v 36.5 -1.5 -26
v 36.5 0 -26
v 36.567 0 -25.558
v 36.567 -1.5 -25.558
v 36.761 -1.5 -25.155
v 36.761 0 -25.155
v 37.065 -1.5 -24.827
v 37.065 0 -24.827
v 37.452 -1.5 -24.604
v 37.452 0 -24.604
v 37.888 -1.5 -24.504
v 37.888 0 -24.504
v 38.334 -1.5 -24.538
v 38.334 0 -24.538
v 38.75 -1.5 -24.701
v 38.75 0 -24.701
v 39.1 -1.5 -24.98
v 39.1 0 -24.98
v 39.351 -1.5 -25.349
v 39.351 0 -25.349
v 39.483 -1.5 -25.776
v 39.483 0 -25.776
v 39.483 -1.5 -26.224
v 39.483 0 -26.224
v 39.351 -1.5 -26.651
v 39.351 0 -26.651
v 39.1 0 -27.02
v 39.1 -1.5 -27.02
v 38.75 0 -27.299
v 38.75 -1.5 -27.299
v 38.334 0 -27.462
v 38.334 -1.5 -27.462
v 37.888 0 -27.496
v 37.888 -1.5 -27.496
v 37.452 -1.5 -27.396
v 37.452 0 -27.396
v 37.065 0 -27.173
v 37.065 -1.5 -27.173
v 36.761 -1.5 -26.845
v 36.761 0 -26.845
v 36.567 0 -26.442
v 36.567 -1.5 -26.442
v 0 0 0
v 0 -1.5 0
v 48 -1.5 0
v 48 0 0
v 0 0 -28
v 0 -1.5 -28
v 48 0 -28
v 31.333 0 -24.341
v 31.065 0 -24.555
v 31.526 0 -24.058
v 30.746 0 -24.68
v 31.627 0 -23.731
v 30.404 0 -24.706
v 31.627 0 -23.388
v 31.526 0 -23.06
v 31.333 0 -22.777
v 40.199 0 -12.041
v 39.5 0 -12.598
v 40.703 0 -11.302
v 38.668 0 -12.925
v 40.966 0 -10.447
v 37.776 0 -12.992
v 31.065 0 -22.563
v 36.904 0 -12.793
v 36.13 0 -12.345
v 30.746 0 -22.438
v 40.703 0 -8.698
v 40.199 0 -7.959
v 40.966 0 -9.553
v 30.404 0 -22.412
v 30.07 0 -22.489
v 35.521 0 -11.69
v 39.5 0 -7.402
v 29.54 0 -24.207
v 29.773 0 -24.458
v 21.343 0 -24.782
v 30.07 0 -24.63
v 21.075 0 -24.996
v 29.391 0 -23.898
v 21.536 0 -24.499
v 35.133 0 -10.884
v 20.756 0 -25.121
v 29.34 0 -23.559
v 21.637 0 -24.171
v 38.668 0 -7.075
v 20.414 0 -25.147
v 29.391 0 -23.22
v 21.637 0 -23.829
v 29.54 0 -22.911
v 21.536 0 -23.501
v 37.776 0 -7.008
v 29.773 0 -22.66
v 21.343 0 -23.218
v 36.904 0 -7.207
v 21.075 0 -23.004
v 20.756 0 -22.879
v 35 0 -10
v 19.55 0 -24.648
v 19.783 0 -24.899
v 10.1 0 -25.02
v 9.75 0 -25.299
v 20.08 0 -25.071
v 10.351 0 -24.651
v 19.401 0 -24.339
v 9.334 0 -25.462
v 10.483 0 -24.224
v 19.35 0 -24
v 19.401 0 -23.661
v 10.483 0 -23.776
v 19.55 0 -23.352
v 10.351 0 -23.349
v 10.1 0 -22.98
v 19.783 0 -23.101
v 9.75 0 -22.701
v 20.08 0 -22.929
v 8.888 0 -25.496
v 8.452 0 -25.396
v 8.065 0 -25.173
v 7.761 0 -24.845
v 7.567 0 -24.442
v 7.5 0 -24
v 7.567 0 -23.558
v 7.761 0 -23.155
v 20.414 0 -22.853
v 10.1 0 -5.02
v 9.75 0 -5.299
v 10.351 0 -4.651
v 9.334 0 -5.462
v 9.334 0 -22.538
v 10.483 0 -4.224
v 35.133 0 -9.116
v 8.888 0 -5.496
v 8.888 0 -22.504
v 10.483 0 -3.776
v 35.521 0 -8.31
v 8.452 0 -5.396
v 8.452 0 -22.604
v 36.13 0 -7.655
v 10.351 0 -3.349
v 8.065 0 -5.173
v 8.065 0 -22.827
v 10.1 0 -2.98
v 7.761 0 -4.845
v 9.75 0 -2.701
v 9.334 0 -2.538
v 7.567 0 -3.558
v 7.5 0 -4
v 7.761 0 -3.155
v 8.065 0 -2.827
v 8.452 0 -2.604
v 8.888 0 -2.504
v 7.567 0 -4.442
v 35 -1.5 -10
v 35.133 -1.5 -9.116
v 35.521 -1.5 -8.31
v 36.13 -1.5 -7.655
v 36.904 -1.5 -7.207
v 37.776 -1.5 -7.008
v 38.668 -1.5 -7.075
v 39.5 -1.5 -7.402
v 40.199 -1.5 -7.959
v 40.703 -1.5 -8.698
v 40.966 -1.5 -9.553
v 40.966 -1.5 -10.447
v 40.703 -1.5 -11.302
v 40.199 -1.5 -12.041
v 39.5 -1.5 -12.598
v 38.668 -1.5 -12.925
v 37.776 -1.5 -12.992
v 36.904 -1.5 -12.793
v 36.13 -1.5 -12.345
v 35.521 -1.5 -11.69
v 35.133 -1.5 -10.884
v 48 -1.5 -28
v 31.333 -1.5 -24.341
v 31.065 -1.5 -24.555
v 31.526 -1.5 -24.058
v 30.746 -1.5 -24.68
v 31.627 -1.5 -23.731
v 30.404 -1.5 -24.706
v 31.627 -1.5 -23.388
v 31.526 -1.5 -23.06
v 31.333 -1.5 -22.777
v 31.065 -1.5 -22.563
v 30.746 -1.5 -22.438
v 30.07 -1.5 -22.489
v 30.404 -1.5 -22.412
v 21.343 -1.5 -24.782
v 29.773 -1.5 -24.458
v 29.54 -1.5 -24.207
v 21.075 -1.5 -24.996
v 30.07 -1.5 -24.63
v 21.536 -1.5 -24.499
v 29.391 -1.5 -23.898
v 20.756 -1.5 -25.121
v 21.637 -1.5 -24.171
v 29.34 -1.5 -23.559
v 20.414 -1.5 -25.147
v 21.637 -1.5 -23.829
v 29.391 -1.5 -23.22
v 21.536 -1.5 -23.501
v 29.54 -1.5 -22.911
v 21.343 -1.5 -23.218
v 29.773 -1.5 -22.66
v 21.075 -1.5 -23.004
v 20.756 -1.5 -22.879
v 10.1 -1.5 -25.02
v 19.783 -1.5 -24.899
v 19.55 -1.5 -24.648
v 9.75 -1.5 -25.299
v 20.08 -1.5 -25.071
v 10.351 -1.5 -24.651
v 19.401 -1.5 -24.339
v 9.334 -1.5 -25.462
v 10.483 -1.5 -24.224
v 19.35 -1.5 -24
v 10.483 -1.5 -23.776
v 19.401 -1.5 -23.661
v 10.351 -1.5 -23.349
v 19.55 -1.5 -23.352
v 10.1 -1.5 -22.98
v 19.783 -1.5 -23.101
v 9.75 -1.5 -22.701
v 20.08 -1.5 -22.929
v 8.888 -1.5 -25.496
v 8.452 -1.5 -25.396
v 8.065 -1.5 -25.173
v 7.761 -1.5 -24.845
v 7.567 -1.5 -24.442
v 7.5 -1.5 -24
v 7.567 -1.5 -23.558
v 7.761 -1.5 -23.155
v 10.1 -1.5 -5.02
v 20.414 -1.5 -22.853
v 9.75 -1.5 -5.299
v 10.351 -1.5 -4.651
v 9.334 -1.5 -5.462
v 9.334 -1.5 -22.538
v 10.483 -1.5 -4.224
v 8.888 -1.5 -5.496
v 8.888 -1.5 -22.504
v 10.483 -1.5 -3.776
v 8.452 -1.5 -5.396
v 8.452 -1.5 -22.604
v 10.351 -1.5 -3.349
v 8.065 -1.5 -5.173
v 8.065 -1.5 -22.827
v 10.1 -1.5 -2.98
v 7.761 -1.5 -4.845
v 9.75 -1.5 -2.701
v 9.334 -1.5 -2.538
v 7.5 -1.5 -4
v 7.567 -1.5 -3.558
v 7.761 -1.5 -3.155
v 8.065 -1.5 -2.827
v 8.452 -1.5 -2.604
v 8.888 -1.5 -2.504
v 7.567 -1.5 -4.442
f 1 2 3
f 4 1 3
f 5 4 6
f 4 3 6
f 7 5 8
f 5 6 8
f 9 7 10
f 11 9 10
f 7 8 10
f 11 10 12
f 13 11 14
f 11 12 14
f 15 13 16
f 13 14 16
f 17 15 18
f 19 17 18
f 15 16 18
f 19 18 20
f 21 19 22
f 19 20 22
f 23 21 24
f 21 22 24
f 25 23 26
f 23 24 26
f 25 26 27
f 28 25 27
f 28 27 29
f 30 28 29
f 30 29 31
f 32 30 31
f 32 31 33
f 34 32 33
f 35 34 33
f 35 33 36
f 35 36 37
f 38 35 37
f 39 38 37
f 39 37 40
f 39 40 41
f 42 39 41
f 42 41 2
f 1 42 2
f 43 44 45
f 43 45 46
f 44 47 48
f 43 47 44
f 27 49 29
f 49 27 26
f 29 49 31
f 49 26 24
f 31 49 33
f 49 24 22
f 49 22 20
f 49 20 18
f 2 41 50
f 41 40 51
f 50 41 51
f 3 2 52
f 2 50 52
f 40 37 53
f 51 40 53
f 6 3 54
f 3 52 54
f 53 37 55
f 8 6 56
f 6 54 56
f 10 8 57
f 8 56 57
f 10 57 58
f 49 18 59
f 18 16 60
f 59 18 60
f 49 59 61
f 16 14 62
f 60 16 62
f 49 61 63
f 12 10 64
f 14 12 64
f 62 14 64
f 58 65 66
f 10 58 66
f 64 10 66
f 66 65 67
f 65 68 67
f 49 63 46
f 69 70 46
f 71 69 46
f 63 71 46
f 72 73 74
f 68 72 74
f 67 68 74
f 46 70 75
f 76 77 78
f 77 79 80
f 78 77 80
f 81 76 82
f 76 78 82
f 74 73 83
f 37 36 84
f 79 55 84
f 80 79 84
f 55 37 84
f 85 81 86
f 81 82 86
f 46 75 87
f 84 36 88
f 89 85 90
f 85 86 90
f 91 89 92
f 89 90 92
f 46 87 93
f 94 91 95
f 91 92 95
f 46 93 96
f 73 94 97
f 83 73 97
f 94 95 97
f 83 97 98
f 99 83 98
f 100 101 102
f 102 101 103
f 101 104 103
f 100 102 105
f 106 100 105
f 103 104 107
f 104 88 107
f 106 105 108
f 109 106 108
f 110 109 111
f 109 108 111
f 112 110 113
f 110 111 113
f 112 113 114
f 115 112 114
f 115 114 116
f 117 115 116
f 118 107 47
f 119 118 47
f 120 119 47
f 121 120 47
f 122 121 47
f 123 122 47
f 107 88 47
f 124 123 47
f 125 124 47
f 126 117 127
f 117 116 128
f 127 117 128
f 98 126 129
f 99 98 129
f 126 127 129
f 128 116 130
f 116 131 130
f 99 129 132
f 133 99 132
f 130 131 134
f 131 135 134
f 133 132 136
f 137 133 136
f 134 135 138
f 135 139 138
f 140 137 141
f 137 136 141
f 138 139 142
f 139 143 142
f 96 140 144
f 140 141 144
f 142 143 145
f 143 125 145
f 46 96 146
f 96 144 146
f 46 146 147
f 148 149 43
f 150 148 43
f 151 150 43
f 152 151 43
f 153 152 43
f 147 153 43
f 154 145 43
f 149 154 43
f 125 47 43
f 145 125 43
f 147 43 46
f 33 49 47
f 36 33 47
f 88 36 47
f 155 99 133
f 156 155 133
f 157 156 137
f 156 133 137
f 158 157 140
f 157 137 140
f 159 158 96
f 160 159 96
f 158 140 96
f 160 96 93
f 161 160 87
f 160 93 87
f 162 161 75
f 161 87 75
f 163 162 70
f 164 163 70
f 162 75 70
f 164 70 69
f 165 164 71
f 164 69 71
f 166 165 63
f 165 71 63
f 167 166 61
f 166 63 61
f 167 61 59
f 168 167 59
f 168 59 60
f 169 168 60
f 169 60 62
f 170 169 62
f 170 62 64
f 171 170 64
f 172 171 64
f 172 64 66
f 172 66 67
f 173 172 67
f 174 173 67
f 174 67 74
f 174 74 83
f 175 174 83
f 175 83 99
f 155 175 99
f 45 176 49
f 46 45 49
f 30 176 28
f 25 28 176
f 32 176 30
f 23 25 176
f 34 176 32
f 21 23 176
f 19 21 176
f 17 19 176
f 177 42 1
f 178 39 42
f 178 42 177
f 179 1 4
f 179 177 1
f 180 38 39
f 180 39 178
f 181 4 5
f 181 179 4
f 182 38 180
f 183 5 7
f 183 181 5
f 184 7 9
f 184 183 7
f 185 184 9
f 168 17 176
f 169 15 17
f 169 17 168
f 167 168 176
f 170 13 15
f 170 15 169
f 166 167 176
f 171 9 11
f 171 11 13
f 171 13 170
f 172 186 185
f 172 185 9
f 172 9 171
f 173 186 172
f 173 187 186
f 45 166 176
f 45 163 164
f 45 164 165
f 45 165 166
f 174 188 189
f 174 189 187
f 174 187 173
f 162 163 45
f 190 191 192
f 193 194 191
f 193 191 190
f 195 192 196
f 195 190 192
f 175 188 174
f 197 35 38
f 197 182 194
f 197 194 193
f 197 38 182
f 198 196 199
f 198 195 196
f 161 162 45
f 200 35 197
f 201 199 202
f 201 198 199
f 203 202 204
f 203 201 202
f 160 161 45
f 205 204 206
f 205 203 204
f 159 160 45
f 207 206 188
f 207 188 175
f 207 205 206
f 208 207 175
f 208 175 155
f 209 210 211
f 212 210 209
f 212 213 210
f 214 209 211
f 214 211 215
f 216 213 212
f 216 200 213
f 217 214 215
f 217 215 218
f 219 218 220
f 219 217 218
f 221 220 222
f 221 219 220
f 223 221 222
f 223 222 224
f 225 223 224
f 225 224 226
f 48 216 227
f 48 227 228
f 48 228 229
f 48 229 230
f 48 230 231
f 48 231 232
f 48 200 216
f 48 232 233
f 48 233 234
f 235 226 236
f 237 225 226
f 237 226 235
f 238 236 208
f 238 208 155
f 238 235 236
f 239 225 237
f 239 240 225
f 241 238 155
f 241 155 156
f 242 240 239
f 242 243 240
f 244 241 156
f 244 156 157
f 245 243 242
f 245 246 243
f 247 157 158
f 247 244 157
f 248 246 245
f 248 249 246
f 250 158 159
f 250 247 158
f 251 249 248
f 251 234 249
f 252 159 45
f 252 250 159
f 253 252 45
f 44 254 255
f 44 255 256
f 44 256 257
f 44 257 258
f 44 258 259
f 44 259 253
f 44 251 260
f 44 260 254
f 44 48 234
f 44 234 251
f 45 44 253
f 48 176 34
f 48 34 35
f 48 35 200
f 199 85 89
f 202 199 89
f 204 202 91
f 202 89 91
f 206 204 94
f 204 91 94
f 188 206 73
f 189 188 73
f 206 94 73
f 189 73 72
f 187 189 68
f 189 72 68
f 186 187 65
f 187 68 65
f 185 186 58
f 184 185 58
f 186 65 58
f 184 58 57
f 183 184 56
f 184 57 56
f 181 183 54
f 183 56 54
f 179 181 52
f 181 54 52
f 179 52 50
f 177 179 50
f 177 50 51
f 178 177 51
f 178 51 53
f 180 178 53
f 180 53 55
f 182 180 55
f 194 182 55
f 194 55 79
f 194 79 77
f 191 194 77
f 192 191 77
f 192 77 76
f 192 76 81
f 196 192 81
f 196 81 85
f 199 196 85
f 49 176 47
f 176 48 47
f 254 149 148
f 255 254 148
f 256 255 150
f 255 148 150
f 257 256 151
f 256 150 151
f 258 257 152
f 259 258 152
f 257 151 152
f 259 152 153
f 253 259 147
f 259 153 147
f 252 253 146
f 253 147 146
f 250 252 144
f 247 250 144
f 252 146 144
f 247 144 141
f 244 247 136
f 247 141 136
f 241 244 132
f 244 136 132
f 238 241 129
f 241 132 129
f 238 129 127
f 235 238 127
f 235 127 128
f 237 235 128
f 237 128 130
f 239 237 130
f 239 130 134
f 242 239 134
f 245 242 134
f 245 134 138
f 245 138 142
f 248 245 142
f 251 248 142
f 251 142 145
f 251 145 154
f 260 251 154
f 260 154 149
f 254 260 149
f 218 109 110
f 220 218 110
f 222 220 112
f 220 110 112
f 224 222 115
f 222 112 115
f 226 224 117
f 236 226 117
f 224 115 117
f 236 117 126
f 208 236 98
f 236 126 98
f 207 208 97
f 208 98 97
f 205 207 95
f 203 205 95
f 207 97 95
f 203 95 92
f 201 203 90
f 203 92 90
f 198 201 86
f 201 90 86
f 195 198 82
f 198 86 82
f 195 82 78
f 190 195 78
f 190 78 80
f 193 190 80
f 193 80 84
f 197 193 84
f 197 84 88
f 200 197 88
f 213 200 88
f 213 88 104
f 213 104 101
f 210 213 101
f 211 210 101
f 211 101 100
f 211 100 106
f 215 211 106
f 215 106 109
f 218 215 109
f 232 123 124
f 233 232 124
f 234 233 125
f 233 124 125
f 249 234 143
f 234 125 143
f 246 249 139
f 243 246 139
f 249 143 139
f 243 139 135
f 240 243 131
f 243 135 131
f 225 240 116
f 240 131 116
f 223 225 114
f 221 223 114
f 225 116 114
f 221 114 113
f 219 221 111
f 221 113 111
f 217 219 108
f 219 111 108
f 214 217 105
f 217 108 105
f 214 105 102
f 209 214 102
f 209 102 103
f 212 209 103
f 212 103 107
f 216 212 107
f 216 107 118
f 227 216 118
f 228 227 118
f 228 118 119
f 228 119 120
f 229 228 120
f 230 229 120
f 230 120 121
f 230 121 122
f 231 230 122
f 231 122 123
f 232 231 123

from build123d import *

# Parameters (mm, degrees)
F0_W      = 40
F0_H      = 28
F1_DEPTH  = 1.5
F3_R      = 1.5
F4_DEPTH  = 1.501
F5_R      = 1.15
F6_DEPTH  = 1.501
F7_W      = 1.5
F7_H      = 28
F8_DEPTH  = 8
F9_R      = 3
F10_DEPTH = 1.501


with BuildPart() as f1:
    # F0 (on Front) → F1 (new body)
    with BuildSketch(Plane.XZ):
        with Locations((20, -14)):
            Rectangle(F0_W, F0_H)
    extrude(amount=F1_DEPTH)

    # F3 (on face) → F4 (cut, through all)
    with BuildSketch(Plane(origin=(0, 0, 0), x_dir=(-1, 0, 0), z_dir=(0, 1, 0))):
        with Locations((-38, -26)):
            Circle(F3_R)
        with Locations((-9, -24)):
            Circle(F3_R)
        with Locations((-9, -4)):
            Circle(F3_R)
    extrude(amount=-F4_DEPTH, mode=Mode.SUBTRACT)

    # F5 (on face) → F6 (cut, through all)
    with BuildSketch(Plane(origin=(0, 0, 0), x_dir=(-1, 0, 0), z_dir=(0, 1, 0))):
        with Locations((-20.5, -24)):
            Circle(F5_R)
        with Locations((-30.490284, -23.559283)):
            Circle(F5_R)
    extrude(amount=-F6_DEPTH, mode=Mode.SUBTRACT)

    # F7 (on face) → F8 (join)
    with BuildSketch(Plane.YZ.offset(40)):
        with Locations((-0.75, -14)):
            Rectangle(F7_W, F7_H)
    extrude(amount=F8_DEPTH)

    # F9 (on face) → F10 (cut, through all)
    with BuildSketch(Plane(origin=(0, 0, 0), x_dir=(-1, 0, 0), z_dir=(0, 1, 0))):
        with Locations((-38, -10)):
            Circle(F9_R)
    extrude(amount=-F10_DEPTH, mode=Mode.SUBTRACT)


solid = f1.part
